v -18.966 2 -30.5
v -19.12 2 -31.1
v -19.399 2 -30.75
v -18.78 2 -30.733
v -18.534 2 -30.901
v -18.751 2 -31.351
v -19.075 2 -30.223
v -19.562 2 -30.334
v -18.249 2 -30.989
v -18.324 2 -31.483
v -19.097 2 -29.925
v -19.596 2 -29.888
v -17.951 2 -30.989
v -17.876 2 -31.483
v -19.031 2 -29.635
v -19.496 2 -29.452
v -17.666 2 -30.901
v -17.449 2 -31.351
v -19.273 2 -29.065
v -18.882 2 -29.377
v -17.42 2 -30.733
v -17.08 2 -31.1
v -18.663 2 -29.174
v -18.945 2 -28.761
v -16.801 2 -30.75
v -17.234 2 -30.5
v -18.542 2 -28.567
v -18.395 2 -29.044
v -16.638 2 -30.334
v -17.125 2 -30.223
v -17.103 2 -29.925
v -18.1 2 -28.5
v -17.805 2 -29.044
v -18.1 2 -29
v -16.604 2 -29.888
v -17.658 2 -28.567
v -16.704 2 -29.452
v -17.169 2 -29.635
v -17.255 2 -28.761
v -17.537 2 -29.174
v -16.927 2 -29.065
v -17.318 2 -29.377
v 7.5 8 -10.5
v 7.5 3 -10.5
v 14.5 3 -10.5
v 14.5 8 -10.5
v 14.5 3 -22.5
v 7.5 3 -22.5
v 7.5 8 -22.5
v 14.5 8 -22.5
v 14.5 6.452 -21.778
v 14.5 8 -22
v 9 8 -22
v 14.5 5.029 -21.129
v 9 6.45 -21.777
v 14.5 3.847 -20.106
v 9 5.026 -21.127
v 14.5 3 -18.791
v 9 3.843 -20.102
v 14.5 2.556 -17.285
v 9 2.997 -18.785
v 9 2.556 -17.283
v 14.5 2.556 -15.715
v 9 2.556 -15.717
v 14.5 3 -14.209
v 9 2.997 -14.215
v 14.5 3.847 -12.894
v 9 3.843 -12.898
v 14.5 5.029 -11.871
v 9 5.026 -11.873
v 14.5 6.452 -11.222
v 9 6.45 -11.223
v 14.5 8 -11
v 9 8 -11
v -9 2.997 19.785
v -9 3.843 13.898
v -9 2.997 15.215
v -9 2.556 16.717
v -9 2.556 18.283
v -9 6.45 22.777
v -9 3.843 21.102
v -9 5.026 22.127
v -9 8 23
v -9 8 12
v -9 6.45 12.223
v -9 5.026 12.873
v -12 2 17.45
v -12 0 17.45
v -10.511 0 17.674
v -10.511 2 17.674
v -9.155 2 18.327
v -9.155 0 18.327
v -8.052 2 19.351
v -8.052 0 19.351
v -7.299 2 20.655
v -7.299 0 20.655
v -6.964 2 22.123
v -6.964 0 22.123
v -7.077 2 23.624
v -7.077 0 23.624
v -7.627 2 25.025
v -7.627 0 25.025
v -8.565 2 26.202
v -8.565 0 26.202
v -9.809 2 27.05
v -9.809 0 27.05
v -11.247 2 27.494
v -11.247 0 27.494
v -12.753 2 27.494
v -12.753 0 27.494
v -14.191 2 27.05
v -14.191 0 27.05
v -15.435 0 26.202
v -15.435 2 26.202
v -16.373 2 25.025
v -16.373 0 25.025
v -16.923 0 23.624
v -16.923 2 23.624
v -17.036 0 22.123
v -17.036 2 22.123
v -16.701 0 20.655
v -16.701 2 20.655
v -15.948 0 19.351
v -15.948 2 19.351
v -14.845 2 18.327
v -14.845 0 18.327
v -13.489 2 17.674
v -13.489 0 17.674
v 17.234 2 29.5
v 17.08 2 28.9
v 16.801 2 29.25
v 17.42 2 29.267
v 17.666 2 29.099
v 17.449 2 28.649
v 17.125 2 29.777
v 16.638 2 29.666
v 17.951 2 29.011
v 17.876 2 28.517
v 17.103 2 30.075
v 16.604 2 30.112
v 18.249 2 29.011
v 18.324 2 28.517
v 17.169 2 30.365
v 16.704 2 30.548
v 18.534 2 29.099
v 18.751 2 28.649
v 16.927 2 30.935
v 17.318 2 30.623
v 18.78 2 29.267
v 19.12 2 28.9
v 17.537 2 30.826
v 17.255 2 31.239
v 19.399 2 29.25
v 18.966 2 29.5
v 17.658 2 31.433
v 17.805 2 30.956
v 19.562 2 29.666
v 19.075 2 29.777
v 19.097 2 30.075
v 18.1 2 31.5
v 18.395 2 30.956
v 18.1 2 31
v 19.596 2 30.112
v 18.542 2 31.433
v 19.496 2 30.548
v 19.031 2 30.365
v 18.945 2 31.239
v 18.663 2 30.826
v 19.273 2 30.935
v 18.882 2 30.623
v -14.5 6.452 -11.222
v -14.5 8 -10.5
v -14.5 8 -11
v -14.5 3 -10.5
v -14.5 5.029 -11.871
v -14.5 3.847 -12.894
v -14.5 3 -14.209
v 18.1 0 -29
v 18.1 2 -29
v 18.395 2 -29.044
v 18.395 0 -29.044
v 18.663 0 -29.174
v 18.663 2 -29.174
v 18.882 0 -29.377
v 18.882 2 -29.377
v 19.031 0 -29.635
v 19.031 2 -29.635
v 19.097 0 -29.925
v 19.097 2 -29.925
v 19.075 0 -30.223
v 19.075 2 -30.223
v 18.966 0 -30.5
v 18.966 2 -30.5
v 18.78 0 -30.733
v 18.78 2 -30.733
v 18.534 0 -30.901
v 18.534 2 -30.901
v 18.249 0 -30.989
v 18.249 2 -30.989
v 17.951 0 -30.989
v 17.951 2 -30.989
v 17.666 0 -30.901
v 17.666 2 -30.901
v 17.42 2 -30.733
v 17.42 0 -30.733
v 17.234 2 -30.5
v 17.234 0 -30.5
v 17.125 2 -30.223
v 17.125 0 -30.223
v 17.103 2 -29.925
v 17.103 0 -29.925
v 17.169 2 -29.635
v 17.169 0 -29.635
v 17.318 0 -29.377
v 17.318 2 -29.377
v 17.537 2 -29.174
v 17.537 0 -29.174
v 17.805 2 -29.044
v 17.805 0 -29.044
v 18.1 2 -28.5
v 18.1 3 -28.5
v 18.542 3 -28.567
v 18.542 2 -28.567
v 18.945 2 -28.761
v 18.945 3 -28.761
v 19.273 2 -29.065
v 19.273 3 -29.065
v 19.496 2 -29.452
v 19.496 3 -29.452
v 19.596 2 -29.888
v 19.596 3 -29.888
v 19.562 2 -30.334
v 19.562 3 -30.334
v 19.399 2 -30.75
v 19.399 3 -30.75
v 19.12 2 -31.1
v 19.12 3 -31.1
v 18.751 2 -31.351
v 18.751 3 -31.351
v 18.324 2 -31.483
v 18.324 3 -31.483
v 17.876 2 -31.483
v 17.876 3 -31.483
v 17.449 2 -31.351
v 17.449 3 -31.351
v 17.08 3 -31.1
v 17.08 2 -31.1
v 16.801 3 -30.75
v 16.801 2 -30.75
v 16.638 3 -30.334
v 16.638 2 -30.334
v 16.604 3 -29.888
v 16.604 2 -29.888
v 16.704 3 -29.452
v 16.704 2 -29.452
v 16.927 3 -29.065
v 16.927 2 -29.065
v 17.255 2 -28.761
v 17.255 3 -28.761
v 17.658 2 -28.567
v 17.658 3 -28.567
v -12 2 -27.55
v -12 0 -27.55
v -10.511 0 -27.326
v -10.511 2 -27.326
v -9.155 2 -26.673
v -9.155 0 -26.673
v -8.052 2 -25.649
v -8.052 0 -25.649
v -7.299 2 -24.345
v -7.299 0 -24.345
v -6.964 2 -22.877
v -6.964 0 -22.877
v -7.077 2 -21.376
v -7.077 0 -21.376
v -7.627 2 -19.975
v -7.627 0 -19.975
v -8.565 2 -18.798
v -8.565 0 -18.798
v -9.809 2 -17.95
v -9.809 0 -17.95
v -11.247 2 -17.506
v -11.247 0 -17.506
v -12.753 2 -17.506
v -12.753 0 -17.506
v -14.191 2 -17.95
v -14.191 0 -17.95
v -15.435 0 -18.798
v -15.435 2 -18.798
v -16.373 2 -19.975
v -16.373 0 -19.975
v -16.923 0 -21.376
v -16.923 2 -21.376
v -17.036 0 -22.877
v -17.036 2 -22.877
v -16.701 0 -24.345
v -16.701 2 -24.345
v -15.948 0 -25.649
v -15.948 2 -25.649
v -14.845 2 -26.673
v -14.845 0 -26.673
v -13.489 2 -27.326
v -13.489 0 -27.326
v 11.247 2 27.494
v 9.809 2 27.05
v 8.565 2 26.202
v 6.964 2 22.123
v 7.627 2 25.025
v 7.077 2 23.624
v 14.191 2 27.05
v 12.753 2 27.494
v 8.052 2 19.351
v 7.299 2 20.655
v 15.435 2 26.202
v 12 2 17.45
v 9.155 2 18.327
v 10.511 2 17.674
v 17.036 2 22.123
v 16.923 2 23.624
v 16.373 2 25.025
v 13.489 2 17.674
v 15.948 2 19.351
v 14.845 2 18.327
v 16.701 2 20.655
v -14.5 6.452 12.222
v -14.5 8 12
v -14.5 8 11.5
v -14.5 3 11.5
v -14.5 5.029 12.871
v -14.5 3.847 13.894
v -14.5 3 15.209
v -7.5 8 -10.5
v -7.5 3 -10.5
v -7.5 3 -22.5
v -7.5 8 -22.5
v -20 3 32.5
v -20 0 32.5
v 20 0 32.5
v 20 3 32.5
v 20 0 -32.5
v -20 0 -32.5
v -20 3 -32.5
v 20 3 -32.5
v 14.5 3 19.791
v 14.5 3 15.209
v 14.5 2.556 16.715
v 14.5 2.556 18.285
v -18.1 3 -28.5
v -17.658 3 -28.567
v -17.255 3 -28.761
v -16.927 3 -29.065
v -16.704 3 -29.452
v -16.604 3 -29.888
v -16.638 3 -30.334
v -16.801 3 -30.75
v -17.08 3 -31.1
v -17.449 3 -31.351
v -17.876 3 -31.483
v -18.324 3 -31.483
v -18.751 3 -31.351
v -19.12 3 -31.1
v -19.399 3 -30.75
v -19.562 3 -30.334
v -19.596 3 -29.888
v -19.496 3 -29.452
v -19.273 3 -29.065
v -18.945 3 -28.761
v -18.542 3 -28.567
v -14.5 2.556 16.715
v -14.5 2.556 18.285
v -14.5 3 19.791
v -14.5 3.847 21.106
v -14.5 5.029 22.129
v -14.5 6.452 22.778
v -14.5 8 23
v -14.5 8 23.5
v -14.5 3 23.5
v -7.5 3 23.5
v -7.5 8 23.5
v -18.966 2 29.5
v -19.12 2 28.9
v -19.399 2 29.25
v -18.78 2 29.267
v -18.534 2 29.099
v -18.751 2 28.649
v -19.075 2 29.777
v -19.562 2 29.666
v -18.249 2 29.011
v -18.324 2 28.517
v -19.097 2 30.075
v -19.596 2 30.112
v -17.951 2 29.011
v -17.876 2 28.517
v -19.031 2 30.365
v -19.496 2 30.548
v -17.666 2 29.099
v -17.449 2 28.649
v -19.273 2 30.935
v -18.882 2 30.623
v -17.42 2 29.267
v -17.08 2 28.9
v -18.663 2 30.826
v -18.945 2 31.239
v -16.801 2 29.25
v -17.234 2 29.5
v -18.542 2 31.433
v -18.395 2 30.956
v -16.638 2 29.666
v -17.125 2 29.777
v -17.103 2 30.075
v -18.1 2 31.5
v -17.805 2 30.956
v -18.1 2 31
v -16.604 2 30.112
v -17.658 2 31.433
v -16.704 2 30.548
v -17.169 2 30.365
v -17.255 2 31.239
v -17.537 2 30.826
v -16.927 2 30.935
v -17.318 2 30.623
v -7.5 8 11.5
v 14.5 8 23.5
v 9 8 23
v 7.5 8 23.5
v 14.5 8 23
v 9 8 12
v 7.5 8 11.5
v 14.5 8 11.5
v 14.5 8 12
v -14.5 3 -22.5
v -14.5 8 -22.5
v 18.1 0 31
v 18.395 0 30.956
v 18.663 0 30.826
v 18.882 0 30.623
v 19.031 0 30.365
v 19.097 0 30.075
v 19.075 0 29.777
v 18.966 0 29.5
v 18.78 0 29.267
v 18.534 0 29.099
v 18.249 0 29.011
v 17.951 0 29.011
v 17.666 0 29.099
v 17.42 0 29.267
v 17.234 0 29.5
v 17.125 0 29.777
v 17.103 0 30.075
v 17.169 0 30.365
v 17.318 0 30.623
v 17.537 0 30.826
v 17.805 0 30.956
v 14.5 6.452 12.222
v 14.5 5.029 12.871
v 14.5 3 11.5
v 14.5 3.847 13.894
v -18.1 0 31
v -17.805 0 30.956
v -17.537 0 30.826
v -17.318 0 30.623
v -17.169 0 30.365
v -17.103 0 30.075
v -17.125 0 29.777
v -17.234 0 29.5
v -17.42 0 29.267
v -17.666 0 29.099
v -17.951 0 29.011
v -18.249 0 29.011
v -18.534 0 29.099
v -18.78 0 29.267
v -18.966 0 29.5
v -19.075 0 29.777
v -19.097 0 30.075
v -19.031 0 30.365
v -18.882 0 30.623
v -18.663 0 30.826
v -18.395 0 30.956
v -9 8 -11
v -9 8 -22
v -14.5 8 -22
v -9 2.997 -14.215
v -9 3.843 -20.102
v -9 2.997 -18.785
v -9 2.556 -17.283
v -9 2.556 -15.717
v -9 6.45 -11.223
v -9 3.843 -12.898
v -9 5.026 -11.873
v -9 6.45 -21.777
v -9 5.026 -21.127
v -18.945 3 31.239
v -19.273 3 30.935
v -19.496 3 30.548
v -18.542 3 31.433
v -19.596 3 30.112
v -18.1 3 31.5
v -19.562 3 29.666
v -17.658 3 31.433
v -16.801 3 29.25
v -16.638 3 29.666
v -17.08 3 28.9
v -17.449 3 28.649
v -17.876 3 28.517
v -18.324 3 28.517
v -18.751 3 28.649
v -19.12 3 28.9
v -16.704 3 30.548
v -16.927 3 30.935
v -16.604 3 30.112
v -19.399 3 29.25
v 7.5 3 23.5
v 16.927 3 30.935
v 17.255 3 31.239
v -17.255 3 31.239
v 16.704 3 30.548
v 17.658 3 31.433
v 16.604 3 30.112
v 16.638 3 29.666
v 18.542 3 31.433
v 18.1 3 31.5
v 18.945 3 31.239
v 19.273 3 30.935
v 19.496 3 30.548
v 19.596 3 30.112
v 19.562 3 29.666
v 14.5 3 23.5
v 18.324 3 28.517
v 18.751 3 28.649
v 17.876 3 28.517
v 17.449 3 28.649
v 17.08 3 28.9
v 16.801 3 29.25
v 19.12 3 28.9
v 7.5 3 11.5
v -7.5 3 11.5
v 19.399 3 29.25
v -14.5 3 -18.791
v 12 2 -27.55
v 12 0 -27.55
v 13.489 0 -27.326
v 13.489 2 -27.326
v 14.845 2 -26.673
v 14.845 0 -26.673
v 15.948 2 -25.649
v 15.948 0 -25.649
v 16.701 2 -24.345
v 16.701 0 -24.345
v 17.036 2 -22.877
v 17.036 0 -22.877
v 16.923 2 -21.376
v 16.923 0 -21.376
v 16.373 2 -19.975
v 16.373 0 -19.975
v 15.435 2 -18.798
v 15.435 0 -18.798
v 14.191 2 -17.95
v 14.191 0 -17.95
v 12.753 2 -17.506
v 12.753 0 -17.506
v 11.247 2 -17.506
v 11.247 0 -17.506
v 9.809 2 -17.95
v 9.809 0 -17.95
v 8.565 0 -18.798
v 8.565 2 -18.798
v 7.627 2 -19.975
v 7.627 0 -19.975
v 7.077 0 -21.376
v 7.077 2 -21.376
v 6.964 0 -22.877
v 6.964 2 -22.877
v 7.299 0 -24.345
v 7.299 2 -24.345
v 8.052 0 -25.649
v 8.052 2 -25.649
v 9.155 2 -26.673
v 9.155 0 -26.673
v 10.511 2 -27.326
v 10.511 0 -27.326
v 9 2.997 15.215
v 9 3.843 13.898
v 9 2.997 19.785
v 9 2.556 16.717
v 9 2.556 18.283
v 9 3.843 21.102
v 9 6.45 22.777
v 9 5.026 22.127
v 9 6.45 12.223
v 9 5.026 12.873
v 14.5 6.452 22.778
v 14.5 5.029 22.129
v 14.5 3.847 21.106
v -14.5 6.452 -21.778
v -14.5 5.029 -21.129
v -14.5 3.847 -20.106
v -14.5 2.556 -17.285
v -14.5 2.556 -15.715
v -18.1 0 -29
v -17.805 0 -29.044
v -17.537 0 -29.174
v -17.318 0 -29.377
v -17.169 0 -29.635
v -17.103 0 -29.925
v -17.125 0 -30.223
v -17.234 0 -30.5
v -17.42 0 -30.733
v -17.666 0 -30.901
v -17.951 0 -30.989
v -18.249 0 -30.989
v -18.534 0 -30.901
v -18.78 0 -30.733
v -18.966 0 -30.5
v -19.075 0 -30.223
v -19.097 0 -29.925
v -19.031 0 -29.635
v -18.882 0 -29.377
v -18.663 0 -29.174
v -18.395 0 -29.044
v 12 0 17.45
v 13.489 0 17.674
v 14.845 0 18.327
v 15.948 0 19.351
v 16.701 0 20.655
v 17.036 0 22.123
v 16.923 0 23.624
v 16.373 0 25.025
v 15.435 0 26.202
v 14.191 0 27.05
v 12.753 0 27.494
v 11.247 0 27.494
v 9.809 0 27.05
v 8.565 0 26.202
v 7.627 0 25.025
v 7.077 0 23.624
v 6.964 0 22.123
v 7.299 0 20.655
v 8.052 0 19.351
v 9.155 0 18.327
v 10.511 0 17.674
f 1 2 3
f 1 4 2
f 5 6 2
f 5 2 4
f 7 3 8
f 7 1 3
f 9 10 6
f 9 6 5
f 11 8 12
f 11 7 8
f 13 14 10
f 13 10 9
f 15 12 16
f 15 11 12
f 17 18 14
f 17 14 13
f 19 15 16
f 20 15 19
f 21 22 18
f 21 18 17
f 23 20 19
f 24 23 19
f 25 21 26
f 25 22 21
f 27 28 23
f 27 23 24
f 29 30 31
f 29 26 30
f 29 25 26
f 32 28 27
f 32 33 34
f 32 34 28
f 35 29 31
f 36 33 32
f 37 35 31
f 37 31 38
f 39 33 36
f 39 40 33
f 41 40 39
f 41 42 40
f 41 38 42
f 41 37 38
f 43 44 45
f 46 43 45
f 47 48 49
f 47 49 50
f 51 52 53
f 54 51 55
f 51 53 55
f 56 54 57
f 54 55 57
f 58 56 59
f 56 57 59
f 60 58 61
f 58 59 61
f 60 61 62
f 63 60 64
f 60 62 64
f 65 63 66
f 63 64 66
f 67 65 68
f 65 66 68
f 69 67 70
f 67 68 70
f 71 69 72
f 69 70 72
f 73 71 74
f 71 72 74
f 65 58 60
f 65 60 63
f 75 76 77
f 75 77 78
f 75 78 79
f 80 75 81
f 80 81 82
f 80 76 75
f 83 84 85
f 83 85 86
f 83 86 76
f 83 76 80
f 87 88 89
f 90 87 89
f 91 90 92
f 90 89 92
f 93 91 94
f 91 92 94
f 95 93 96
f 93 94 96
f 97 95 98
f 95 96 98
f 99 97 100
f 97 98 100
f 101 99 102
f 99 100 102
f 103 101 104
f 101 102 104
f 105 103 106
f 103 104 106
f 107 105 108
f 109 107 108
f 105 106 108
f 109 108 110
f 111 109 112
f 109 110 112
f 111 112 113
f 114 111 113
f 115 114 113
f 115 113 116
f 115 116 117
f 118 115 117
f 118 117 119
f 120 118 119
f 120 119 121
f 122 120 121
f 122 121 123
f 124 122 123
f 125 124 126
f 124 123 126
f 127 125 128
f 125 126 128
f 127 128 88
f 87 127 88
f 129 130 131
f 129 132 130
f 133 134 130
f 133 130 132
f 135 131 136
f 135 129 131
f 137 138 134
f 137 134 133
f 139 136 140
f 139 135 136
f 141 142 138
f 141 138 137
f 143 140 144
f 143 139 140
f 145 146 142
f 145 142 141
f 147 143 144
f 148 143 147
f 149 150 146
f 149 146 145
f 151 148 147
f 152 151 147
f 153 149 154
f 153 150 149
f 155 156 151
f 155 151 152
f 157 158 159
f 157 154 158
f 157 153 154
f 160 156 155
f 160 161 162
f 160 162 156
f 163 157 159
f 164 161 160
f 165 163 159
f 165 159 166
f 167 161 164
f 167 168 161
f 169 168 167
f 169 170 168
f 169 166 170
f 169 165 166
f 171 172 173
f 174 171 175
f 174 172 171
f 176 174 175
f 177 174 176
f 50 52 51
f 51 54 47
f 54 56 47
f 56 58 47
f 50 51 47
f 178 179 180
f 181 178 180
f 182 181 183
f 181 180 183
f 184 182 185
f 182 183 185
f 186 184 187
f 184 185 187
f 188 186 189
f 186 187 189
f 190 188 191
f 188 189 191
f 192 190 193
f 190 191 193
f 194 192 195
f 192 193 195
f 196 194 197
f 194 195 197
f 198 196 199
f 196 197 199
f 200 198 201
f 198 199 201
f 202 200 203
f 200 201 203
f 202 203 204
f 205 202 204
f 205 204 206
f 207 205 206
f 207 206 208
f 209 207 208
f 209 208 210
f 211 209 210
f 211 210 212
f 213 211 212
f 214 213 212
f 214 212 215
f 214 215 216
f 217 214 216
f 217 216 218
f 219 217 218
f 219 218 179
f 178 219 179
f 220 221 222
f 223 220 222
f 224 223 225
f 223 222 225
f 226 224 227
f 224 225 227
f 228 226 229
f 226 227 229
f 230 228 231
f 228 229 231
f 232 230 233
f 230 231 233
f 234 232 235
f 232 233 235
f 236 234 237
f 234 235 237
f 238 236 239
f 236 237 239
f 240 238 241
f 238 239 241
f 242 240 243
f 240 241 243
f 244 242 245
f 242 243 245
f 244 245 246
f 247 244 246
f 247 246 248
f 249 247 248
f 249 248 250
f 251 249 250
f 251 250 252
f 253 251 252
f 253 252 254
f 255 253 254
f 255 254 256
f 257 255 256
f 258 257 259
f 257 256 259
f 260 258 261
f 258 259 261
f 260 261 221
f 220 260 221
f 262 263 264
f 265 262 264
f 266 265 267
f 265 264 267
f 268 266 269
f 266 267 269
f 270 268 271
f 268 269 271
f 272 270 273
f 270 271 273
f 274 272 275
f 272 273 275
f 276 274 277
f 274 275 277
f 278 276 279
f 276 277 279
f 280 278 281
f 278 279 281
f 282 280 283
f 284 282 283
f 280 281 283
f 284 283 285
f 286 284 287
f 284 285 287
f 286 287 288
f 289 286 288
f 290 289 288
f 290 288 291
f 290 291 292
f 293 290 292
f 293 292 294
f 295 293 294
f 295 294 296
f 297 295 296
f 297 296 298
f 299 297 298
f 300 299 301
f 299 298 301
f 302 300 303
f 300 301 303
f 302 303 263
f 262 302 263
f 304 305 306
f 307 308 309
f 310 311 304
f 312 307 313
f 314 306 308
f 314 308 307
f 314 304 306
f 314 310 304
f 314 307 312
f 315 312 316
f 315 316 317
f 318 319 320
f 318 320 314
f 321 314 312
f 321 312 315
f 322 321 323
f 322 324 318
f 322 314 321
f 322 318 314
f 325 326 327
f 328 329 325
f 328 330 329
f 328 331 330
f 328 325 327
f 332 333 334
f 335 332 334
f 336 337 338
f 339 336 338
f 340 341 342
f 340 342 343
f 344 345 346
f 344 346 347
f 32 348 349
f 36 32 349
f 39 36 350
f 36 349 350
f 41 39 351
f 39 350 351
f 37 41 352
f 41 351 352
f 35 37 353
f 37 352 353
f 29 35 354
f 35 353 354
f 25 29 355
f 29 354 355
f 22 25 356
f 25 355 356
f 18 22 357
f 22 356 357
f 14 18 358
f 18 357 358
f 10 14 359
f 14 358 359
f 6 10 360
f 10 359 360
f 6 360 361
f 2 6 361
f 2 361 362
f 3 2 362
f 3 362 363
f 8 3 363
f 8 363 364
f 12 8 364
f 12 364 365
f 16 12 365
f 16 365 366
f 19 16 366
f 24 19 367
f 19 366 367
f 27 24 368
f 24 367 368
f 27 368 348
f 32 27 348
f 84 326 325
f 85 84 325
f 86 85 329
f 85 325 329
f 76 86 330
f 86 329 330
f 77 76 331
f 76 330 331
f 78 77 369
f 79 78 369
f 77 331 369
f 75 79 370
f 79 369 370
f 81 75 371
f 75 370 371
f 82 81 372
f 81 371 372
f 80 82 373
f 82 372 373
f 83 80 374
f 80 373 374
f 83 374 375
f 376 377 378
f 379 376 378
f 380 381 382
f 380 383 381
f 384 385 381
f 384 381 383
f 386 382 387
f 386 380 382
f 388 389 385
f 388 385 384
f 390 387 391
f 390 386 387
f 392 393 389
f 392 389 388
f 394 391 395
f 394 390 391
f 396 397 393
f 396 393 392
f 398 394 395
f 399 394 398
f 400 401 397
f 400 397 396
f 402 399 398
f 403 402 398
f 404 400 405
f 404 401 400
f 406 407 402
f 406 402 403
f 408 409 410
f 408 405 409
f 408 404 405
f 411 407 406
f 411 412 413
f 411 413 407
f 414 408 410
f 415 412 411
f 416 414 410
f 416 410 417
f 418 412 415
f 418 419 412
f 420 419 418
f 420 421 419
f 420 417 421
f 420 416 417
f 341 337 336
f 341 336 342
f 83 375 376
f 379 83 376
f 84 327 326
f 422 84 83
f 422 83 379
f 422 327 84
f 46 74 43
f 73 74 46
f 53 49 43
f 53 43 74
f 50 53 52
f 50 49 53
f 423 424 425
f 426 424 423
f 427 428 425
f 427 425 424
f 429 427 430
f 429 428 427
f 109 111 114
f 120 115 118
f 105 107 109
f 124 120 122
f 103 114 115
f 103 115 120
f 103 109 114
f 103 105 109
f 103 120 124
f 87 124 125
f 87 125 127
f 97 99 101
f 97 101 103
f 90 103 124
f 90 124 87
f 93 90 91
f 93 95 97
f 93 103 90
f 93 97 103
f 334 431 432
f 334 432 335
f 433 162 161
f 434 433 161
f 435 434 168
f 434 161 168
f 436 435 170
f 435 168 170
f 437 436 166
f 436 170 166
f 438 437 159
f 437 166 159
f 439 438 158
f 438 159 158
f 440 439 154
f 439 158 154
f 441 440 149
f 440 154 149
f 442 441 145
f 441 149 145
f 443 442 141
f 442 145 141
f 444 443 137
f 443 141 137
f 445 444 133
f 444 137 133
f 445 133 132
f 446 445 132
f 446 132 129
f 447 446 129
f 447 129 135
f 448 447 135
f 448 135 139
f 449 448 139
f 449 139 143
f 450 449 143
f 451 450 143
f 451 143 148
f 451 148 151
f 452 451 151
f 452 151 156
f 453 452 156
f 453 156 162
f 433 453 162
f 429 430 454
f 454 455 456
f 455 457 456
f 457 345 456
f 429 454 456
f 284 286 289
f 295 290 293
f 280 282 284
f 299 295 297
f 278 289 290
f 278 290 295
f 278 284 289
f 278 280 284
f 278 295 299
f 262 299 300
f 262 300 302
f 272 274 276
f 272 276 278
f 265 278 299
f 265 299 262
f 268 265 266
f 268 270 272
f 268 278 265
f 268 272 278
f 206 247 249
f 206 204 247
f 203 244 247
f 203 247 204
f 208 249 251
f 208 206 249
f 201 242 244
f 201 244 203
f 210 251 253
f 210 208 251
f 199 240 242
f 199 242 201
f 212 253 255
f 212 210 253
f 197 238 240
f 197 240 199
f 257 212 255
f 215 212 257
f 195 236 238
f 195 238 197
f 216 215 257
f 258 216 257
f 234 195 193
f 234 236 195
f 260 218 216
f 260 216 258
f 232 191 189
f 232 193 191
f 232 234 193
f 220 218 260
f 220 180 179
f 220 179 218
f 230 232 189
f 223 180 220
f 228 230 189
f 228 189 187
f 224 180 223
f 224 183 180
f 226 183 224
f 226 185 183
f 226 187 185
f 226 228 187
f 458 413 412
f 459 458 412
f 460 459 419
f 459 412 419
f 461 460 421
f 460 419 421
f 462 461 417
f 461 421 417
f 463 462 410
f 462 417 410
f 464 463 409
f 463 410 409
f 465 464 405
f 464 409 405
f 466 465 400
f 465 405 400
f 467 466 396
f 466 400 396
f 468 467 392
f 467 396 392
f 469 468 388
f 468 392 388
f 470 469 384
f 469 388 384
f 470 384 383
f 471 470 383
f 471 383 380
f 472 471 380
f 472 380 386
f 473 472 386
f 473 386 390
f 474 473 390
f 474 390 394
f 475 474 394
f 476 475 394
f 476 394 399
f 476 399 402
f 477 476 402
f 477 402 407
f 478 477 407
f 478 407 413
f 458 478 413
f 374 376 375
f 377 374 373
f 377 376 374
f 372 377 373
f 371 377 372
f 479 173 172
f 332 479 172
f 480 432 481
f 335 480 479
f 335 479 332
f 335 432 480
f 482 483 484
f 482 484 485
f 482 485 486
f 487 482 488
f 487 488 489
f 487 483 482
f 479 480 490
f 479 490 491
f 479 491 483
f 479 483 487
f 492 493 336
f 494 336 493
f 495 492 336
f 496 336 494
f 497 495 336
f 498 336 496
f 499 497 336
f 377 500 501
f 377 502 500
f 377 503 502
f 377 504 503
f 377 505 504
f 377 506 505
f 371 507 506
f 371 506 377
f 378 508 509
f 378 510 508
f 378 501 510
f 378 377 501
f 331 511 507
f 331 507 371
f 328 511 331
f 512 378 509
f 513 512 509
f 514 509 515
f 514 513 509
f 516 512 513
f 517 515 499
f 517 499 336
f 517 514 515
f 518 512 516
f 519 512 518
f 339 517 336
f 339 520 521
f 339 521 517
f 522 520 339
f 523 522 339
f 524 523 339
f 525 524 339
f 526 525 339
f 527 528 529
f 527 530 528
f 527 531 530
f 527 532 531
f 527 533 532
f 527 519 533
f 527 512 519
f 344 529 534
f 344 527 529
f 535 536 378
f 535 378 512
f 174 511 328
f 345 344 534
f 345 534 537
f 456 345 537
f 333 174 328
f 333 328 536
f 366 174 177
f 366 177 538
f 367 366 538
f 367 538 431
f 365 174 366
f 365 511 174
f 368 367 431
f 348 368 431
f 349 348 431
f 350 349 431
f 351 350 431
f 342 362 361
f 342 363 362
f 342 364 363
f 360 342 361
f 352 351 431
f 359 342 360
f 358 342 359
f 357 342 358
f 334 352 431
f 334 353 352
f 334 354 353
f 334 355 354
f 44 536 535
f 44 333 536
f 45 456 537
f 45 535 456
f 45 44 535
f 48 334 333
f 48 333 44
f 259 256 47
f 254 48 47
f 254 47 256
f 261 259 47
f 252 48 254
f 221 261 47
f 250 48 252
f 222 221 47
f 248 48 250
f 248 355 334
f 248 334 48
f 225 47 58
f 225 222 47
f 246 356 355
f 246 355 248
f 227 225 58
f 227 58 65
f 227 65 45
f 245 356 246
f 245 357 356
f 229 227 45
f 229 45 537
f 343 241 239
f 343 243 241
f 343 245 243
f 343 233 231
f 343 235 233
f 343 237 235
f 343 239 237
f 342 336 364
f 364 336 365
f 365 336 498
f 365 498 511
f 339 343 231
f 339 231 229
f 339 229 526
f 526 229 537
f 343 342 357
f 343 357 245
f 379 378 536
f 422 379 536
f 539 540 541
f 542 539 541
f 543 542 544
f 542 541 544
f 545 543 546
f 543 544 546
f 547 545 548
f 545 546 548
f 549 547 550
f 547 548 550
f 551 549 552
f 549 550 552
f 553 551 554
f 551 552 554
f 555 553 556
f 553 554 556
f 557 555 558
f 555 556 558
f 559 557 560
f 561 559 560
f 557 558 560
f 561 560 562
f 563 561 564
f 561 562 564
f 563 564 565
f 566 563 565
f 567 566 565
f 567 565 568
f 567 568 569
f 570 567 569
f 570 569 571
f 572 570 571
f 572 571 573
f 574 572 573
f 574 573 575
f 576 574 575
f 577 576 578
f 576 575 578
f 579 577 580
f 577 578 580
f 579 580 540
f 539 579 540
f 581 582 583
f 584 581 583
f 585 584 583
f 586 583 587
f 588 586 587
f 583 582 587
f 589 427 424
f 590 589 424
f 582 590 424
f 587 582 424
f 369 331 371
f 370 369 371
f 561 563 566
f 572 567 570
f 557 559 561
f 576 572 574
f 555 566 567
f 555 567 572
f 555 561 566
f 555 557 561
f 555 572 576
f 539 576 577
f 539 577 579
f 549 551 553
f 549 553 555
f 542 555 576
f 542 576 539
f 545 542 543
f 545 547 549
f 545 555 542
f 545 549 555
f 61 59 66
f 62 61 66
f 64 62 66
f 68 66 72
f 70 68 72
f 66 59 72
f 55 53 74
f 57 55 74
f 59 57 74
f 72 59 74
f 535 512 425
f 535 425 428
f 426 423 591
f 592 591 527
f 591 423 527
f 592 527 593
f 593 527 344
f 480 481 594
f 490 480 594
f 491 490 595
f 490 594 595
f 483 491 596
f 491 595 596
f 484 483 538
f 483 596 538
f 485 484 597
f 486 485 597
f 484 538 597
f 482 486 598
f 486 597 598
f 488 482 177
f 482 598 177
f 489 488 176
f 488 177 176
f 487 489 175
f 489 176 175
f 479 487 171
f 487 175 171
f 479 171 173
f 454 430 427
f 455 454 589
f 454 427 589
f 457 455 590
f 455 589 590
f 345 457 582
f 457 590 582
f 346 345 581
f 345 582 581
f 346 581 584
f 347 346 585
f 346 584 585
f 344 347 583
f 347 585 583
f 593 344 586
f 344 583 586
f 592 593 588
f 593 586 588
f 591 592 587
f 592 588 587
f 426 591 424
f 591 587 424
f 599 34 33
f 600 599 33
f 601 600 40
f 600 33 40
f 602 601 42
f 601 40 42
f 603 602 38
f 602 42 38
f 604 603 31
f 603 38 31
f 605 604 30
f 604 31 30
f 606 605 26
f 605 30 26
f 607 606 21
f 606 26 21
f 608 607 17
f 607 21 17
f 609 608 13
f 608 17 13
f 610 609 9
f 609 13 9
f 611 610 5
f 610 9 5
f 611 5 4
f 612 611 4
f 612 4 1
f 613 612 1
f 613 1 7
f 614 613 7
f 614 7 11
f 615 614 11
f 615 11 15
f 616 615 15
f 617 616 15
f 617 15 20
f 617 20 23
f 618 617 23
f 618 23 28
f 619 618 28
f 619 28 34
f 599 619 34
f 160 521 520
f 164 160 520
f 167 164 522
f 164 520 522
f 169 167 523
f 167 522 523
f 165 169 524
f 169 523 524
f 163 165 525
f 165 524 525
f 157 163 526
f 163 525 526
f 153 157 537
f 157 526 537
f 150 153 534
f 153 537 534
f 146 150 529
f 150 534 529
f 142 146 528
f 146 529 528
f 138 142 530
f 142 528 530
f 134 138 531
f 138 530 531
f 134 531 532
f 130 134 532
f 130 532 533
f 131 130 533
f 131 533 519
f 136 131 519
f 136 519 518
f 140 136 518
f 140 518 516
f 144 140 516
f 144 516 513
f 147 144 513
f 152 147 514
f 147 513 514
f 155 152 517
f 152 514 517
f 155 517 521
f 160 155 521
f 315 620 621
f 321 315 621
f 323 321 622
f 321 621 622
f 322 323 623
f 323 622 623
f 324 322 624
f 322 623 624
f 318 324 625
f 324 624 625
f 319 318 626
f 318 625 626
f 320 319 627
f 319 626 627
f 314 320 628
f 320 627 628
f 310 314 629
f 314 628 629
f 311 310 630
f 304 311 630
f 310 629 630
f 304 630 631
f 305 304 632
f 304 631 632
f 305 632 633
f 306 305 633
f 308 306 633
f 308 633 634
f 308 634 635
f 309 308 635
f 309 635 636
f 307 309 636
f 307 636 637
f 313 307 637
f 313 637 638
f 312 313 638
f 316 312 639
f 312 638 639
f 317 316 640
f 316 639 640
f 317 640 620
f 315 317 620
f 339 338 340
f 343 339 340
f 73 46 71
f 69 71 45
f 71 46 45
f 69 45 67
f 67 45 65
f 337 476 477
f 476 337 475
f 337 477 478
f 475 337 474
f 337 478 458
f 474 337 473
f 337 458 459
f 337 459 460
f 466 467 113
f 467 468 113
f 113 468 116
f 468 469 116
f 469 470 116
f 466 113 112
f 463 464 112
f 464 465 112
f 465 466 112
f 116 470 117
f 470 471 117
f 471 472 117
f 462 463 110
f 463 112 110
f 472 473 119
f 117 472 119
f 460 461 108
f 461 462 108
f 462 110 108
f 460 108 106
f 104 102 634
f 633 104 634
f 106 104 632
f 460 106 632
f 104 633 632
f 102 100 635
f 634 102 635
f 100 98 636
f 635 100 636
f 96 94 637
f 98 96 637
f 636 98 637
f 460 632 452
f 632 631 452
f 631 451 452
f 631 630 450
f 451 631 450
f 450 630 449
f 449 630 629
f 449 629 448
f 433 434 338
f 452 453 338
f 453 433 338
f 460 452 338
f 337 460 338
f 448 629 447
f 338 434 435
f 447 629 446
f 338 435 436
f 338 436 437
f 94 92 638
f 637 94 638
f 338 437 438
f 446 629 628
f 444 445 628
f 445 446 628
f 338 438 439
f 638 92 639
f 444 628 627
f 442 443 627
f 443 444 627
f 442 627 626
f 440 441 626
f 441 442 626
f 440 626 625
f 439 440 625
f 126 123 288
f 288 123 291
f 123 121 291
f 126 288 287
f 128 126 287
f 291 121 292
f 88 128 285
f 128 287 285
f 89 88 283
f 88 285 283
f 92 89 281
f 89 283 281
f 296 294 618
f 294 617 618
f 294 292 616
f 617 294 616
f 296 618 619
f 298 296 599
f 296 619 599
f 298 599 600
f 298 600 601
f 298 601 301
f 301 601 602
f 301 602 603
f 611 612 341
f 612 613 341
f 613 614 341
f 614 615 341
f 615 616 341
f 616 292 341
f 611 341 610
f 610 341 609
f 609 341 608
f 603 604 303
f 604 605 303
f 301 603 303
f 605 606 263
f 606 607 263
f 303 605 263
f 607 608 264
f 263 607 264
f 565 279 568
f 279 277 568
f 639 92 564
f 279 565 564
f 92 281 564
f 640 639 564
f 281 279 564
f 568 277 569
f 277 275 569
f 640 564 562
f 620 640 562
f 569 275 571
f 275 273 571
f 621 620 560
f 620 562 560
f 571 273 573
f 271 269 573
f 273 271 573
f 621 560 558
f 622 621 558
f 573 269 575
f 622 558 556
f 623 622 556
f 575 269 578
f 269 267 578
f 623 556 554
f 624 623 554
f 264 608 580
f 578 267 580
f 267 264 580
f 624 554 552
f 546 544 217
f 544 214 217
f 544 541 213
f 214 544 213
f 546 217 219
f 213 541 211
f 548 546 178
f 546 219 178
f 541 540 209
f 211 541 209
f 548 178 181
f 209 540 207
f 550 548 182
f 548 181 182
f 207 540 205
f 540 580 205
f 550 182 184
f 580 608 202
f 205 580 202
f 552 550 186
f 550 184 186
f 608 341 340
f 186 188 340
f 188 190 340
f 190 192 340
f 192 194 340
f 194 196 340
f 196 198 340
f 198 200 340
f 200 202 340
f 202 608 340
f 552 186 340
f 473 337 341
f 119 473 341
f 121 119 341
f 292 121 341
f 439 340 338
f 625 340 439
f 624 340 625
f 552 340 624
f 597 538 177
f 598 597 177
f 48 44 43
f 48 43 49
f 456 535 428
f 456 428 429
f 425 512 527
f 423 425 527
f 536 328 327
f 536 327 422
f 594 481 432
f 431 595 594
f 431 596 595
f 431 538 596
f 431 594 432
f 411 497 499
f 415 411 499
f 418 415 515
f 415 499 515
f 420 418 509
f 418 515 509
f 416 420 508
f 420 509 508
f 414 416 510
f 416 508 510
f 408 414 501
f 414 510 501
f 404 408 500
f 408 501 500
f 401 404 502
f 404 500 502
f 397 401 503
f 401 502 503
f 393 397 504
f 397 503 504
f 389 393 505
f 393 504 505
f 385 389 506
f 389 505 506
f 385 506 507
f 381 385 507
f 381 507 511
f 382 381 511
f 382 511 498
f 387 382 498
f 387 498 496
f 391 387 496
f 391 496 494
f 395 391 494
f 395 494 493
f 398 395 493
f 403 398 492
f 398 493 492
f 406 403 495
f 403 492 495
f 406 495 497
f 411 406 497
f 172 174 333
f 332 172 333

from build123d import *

# Parameters (mm, degrees)
SKETCH_4_W          = 40
SKETCH_4_H          = 65
EXTRUDE_1_DEPTH     = 3
SKETCH_5_R          = 5.05
CUT_EXTRUDE_1_DEPTH = 2
SKETCH_6_R          = 1.5
SKETCH_6_R_2        = 1
CUT_EXTRUDE_2_DEPTH = 1
SKETCH_6_2_R        = 1
CUT_EXTRUDE_3_DEPTH = 39.278584091
SKETCH_7_W          = 7
SKETCH_7_H          = 12
EXTRUDE_2_DEPTH     = 5
SKETCH_8_R          = 5.5
CUT_EXTRUDE_4_DEPTH = 5.5
CUT_EXTRUDE_START   = -23.5
SKETCH_8_2_R        = 5.5
CUT_EXTRUDE_5_DEPTH = 5.5


with BuildPart() as part:
    # 草图4 → 凸台-拉伸1 (new body)
    with BuildSketch(Plane(origin=(0, 0, 0), x_dir=(1, 0, 0), z_dir=(0, 1, 0))):
        Rectangle(SKETCH_4_W, SKETCH_4_H)
    extrude(amount=EXTRUDE_1_DEPTH)

    # 草图5 → 切除-拉伸1 (cut)
    with BuildSketch(Plane.XZ):
        with Locations(Location((-12, 22.5, 0), (0, 0, 270))):
            Circle(SKETCH_5_R)
        with Locations(Location((12, 22.5, 0), (0, 0, 270))):
            Circle(SKETCH_5_R)
        with Locations(Location((12, -22.5, 0), (0, 0, 270))):
            Circle(SKETCH_5_R)
        with Locations(Location((-12, -22.5, 0), (0, 0, 270))):
            Circle(SKETCH_5_R)
    extrude(amount=-CUT_EXTRUDE_1_DEPTH, mode=Mode.SUBTRACT)

    # 草图6 → 切除-拉伸2 (cut)
    # profile 1 of 4: a face of its own
    with BuildSketch(Plane(origin=(0, 3, 0), x_dir=(1, 0, 0), z_dir=(0, 1, 0))):
        with Locations(Location((-18.1, 30, 0), (0, 0, 270))):
            Circle(SKETCH_6_R)
        with Locations(Location((-18.1, 30, 0), (0, 0, 270))):
            Circle(SKETCH_6_R_2, mode=Mode.SUBTRACT)
    # profile 2 of 4: a face of its own
    with BuildSketch(Plane(origin=(0, 3, 0), x_dir=(1, 0, 0), z_dir=(0, 1, 0))):
        with Locations(Location((18.1, 30, 0), (0, 0, 270))):
            Circle(SKETCH_6_R)
        with Locations(Location((18.1, 30, 0), (0, 0, 270))):
            Circle(SKETCH_6_R_2, mode=Mode.SUBTRACT)
    # profile 3 of 4: a face of its own
    with BuildSketch(Plane(origin=(0, 3, 0), x_dir=(1, 0, 0), z_dir=(0, 1, 0))):
        with Locations(Location((-18.1, -30, 0), (0, 0, 270))):
            Circle(SKETCH_6_R)
        with Locations(Location((-18.1, -30, 0), (0, 0, 270))):
            Circle(SKETCH_6_R_2, mode=Mode.SUBTRACT)
    # profile 4 of 4: a face of its own
    with BuildSketch(Plane(origin=(0, 3, 0), x_dir=(1, 0, 0), z_dir=(0, 1, 0))):
        with Locations(Location((18.1, -30, 0), (0, 0, 270))):
            Circle(SKETCH_6_R)
        with Locations(Location((18.1, -30, 0), (0, 0, 270))):
            Circle(SKETCH_6_R_2, mode=Mode.SUBTRACT)
    extrude(amount=-CUT_EXTRUDE_2_DEPTH, mode=Mode.SUBTRACT)

    # 草图6<2> → 切除-拉伸3 (cut, through all)
    with BuildSketch(Plane(origin=(0, 3, 0), x_dir=(1, 0, 0), z_dir=(0, 1, 0))):
        with Locations(Location((-18.1, -30, 0), (0, 0, 270))):
            Circle(SKETCH_6_2_R)
        with Locations(Location((18.1, -30, 0), (0, 0, 270))):
            Circle(SKETCH_6_2_R)
        with Locations(Location((18.1, 30, 0), (0, 0, 270))):
            Circle(SKETCH_6_2_R)
        with Locations(Location((-18.1, 30, 0), (0, 0, 270))):
            Circle(SKETCH_6_2_R)
    extrude(amount=-CUT_EXTRUDE_3_DEPTH, mode=Mode.SUBTRACT)

    # 草图7 → 凸台-拉伸2 (add)
    with BuildSketch(Plane(origin=(0, 3, 0), x_dir=(1, 0, 0), z_dir=(0, 1, 0))):
        with Locations((-11, 16.5)):
            Rectangle(SKETCH_7_W, SKETCH_7_H)
        with Locations((11, 16.5)):
            Rectangle(SKETCH_7_W, SKETCH_7_H)
        with Locations((11, -17.5)):
            Rectangle(SKETCH_7_W, SKETCH_7_H)
        with Locations((-11, -17.5)):
            Rectangle(SKETCH_7_W, SKETCH_7_H)
    extrude(amount=EXTRUDE_2_DEPTH)

    # 草图8 → 切除-拉伸4 (cut)
    with BuildSketch(Plane.ZY.offset(14.5)):
        with Locations((-16.5, 8)):
            Circle(SKETCH_8_R)
        with Locations((17.5, 8)):
            Circle(SKETCH_8_R)
    extrude(amount=-CUT_EXTRUDE_4_DEPTH, mode=Mode.SUBTRACT)

    # 草图8<2> → 切除-拉伸5 (cut)
    with BuildSketch(Plane.ZY.offset(14.5).offset(CUT_EXTRUDE_START)):
        with Locations((-16.5, 8)):
            Circle(SKETCH_8_2_R)
        with Locations((17.5, 8)):
            Circle(SKETCH_8_2_R)
    extrude(amount=-CUT_EXTRUDE_5_DEPTH, mode=Mode.SUBTRACT)


solid = part.part
